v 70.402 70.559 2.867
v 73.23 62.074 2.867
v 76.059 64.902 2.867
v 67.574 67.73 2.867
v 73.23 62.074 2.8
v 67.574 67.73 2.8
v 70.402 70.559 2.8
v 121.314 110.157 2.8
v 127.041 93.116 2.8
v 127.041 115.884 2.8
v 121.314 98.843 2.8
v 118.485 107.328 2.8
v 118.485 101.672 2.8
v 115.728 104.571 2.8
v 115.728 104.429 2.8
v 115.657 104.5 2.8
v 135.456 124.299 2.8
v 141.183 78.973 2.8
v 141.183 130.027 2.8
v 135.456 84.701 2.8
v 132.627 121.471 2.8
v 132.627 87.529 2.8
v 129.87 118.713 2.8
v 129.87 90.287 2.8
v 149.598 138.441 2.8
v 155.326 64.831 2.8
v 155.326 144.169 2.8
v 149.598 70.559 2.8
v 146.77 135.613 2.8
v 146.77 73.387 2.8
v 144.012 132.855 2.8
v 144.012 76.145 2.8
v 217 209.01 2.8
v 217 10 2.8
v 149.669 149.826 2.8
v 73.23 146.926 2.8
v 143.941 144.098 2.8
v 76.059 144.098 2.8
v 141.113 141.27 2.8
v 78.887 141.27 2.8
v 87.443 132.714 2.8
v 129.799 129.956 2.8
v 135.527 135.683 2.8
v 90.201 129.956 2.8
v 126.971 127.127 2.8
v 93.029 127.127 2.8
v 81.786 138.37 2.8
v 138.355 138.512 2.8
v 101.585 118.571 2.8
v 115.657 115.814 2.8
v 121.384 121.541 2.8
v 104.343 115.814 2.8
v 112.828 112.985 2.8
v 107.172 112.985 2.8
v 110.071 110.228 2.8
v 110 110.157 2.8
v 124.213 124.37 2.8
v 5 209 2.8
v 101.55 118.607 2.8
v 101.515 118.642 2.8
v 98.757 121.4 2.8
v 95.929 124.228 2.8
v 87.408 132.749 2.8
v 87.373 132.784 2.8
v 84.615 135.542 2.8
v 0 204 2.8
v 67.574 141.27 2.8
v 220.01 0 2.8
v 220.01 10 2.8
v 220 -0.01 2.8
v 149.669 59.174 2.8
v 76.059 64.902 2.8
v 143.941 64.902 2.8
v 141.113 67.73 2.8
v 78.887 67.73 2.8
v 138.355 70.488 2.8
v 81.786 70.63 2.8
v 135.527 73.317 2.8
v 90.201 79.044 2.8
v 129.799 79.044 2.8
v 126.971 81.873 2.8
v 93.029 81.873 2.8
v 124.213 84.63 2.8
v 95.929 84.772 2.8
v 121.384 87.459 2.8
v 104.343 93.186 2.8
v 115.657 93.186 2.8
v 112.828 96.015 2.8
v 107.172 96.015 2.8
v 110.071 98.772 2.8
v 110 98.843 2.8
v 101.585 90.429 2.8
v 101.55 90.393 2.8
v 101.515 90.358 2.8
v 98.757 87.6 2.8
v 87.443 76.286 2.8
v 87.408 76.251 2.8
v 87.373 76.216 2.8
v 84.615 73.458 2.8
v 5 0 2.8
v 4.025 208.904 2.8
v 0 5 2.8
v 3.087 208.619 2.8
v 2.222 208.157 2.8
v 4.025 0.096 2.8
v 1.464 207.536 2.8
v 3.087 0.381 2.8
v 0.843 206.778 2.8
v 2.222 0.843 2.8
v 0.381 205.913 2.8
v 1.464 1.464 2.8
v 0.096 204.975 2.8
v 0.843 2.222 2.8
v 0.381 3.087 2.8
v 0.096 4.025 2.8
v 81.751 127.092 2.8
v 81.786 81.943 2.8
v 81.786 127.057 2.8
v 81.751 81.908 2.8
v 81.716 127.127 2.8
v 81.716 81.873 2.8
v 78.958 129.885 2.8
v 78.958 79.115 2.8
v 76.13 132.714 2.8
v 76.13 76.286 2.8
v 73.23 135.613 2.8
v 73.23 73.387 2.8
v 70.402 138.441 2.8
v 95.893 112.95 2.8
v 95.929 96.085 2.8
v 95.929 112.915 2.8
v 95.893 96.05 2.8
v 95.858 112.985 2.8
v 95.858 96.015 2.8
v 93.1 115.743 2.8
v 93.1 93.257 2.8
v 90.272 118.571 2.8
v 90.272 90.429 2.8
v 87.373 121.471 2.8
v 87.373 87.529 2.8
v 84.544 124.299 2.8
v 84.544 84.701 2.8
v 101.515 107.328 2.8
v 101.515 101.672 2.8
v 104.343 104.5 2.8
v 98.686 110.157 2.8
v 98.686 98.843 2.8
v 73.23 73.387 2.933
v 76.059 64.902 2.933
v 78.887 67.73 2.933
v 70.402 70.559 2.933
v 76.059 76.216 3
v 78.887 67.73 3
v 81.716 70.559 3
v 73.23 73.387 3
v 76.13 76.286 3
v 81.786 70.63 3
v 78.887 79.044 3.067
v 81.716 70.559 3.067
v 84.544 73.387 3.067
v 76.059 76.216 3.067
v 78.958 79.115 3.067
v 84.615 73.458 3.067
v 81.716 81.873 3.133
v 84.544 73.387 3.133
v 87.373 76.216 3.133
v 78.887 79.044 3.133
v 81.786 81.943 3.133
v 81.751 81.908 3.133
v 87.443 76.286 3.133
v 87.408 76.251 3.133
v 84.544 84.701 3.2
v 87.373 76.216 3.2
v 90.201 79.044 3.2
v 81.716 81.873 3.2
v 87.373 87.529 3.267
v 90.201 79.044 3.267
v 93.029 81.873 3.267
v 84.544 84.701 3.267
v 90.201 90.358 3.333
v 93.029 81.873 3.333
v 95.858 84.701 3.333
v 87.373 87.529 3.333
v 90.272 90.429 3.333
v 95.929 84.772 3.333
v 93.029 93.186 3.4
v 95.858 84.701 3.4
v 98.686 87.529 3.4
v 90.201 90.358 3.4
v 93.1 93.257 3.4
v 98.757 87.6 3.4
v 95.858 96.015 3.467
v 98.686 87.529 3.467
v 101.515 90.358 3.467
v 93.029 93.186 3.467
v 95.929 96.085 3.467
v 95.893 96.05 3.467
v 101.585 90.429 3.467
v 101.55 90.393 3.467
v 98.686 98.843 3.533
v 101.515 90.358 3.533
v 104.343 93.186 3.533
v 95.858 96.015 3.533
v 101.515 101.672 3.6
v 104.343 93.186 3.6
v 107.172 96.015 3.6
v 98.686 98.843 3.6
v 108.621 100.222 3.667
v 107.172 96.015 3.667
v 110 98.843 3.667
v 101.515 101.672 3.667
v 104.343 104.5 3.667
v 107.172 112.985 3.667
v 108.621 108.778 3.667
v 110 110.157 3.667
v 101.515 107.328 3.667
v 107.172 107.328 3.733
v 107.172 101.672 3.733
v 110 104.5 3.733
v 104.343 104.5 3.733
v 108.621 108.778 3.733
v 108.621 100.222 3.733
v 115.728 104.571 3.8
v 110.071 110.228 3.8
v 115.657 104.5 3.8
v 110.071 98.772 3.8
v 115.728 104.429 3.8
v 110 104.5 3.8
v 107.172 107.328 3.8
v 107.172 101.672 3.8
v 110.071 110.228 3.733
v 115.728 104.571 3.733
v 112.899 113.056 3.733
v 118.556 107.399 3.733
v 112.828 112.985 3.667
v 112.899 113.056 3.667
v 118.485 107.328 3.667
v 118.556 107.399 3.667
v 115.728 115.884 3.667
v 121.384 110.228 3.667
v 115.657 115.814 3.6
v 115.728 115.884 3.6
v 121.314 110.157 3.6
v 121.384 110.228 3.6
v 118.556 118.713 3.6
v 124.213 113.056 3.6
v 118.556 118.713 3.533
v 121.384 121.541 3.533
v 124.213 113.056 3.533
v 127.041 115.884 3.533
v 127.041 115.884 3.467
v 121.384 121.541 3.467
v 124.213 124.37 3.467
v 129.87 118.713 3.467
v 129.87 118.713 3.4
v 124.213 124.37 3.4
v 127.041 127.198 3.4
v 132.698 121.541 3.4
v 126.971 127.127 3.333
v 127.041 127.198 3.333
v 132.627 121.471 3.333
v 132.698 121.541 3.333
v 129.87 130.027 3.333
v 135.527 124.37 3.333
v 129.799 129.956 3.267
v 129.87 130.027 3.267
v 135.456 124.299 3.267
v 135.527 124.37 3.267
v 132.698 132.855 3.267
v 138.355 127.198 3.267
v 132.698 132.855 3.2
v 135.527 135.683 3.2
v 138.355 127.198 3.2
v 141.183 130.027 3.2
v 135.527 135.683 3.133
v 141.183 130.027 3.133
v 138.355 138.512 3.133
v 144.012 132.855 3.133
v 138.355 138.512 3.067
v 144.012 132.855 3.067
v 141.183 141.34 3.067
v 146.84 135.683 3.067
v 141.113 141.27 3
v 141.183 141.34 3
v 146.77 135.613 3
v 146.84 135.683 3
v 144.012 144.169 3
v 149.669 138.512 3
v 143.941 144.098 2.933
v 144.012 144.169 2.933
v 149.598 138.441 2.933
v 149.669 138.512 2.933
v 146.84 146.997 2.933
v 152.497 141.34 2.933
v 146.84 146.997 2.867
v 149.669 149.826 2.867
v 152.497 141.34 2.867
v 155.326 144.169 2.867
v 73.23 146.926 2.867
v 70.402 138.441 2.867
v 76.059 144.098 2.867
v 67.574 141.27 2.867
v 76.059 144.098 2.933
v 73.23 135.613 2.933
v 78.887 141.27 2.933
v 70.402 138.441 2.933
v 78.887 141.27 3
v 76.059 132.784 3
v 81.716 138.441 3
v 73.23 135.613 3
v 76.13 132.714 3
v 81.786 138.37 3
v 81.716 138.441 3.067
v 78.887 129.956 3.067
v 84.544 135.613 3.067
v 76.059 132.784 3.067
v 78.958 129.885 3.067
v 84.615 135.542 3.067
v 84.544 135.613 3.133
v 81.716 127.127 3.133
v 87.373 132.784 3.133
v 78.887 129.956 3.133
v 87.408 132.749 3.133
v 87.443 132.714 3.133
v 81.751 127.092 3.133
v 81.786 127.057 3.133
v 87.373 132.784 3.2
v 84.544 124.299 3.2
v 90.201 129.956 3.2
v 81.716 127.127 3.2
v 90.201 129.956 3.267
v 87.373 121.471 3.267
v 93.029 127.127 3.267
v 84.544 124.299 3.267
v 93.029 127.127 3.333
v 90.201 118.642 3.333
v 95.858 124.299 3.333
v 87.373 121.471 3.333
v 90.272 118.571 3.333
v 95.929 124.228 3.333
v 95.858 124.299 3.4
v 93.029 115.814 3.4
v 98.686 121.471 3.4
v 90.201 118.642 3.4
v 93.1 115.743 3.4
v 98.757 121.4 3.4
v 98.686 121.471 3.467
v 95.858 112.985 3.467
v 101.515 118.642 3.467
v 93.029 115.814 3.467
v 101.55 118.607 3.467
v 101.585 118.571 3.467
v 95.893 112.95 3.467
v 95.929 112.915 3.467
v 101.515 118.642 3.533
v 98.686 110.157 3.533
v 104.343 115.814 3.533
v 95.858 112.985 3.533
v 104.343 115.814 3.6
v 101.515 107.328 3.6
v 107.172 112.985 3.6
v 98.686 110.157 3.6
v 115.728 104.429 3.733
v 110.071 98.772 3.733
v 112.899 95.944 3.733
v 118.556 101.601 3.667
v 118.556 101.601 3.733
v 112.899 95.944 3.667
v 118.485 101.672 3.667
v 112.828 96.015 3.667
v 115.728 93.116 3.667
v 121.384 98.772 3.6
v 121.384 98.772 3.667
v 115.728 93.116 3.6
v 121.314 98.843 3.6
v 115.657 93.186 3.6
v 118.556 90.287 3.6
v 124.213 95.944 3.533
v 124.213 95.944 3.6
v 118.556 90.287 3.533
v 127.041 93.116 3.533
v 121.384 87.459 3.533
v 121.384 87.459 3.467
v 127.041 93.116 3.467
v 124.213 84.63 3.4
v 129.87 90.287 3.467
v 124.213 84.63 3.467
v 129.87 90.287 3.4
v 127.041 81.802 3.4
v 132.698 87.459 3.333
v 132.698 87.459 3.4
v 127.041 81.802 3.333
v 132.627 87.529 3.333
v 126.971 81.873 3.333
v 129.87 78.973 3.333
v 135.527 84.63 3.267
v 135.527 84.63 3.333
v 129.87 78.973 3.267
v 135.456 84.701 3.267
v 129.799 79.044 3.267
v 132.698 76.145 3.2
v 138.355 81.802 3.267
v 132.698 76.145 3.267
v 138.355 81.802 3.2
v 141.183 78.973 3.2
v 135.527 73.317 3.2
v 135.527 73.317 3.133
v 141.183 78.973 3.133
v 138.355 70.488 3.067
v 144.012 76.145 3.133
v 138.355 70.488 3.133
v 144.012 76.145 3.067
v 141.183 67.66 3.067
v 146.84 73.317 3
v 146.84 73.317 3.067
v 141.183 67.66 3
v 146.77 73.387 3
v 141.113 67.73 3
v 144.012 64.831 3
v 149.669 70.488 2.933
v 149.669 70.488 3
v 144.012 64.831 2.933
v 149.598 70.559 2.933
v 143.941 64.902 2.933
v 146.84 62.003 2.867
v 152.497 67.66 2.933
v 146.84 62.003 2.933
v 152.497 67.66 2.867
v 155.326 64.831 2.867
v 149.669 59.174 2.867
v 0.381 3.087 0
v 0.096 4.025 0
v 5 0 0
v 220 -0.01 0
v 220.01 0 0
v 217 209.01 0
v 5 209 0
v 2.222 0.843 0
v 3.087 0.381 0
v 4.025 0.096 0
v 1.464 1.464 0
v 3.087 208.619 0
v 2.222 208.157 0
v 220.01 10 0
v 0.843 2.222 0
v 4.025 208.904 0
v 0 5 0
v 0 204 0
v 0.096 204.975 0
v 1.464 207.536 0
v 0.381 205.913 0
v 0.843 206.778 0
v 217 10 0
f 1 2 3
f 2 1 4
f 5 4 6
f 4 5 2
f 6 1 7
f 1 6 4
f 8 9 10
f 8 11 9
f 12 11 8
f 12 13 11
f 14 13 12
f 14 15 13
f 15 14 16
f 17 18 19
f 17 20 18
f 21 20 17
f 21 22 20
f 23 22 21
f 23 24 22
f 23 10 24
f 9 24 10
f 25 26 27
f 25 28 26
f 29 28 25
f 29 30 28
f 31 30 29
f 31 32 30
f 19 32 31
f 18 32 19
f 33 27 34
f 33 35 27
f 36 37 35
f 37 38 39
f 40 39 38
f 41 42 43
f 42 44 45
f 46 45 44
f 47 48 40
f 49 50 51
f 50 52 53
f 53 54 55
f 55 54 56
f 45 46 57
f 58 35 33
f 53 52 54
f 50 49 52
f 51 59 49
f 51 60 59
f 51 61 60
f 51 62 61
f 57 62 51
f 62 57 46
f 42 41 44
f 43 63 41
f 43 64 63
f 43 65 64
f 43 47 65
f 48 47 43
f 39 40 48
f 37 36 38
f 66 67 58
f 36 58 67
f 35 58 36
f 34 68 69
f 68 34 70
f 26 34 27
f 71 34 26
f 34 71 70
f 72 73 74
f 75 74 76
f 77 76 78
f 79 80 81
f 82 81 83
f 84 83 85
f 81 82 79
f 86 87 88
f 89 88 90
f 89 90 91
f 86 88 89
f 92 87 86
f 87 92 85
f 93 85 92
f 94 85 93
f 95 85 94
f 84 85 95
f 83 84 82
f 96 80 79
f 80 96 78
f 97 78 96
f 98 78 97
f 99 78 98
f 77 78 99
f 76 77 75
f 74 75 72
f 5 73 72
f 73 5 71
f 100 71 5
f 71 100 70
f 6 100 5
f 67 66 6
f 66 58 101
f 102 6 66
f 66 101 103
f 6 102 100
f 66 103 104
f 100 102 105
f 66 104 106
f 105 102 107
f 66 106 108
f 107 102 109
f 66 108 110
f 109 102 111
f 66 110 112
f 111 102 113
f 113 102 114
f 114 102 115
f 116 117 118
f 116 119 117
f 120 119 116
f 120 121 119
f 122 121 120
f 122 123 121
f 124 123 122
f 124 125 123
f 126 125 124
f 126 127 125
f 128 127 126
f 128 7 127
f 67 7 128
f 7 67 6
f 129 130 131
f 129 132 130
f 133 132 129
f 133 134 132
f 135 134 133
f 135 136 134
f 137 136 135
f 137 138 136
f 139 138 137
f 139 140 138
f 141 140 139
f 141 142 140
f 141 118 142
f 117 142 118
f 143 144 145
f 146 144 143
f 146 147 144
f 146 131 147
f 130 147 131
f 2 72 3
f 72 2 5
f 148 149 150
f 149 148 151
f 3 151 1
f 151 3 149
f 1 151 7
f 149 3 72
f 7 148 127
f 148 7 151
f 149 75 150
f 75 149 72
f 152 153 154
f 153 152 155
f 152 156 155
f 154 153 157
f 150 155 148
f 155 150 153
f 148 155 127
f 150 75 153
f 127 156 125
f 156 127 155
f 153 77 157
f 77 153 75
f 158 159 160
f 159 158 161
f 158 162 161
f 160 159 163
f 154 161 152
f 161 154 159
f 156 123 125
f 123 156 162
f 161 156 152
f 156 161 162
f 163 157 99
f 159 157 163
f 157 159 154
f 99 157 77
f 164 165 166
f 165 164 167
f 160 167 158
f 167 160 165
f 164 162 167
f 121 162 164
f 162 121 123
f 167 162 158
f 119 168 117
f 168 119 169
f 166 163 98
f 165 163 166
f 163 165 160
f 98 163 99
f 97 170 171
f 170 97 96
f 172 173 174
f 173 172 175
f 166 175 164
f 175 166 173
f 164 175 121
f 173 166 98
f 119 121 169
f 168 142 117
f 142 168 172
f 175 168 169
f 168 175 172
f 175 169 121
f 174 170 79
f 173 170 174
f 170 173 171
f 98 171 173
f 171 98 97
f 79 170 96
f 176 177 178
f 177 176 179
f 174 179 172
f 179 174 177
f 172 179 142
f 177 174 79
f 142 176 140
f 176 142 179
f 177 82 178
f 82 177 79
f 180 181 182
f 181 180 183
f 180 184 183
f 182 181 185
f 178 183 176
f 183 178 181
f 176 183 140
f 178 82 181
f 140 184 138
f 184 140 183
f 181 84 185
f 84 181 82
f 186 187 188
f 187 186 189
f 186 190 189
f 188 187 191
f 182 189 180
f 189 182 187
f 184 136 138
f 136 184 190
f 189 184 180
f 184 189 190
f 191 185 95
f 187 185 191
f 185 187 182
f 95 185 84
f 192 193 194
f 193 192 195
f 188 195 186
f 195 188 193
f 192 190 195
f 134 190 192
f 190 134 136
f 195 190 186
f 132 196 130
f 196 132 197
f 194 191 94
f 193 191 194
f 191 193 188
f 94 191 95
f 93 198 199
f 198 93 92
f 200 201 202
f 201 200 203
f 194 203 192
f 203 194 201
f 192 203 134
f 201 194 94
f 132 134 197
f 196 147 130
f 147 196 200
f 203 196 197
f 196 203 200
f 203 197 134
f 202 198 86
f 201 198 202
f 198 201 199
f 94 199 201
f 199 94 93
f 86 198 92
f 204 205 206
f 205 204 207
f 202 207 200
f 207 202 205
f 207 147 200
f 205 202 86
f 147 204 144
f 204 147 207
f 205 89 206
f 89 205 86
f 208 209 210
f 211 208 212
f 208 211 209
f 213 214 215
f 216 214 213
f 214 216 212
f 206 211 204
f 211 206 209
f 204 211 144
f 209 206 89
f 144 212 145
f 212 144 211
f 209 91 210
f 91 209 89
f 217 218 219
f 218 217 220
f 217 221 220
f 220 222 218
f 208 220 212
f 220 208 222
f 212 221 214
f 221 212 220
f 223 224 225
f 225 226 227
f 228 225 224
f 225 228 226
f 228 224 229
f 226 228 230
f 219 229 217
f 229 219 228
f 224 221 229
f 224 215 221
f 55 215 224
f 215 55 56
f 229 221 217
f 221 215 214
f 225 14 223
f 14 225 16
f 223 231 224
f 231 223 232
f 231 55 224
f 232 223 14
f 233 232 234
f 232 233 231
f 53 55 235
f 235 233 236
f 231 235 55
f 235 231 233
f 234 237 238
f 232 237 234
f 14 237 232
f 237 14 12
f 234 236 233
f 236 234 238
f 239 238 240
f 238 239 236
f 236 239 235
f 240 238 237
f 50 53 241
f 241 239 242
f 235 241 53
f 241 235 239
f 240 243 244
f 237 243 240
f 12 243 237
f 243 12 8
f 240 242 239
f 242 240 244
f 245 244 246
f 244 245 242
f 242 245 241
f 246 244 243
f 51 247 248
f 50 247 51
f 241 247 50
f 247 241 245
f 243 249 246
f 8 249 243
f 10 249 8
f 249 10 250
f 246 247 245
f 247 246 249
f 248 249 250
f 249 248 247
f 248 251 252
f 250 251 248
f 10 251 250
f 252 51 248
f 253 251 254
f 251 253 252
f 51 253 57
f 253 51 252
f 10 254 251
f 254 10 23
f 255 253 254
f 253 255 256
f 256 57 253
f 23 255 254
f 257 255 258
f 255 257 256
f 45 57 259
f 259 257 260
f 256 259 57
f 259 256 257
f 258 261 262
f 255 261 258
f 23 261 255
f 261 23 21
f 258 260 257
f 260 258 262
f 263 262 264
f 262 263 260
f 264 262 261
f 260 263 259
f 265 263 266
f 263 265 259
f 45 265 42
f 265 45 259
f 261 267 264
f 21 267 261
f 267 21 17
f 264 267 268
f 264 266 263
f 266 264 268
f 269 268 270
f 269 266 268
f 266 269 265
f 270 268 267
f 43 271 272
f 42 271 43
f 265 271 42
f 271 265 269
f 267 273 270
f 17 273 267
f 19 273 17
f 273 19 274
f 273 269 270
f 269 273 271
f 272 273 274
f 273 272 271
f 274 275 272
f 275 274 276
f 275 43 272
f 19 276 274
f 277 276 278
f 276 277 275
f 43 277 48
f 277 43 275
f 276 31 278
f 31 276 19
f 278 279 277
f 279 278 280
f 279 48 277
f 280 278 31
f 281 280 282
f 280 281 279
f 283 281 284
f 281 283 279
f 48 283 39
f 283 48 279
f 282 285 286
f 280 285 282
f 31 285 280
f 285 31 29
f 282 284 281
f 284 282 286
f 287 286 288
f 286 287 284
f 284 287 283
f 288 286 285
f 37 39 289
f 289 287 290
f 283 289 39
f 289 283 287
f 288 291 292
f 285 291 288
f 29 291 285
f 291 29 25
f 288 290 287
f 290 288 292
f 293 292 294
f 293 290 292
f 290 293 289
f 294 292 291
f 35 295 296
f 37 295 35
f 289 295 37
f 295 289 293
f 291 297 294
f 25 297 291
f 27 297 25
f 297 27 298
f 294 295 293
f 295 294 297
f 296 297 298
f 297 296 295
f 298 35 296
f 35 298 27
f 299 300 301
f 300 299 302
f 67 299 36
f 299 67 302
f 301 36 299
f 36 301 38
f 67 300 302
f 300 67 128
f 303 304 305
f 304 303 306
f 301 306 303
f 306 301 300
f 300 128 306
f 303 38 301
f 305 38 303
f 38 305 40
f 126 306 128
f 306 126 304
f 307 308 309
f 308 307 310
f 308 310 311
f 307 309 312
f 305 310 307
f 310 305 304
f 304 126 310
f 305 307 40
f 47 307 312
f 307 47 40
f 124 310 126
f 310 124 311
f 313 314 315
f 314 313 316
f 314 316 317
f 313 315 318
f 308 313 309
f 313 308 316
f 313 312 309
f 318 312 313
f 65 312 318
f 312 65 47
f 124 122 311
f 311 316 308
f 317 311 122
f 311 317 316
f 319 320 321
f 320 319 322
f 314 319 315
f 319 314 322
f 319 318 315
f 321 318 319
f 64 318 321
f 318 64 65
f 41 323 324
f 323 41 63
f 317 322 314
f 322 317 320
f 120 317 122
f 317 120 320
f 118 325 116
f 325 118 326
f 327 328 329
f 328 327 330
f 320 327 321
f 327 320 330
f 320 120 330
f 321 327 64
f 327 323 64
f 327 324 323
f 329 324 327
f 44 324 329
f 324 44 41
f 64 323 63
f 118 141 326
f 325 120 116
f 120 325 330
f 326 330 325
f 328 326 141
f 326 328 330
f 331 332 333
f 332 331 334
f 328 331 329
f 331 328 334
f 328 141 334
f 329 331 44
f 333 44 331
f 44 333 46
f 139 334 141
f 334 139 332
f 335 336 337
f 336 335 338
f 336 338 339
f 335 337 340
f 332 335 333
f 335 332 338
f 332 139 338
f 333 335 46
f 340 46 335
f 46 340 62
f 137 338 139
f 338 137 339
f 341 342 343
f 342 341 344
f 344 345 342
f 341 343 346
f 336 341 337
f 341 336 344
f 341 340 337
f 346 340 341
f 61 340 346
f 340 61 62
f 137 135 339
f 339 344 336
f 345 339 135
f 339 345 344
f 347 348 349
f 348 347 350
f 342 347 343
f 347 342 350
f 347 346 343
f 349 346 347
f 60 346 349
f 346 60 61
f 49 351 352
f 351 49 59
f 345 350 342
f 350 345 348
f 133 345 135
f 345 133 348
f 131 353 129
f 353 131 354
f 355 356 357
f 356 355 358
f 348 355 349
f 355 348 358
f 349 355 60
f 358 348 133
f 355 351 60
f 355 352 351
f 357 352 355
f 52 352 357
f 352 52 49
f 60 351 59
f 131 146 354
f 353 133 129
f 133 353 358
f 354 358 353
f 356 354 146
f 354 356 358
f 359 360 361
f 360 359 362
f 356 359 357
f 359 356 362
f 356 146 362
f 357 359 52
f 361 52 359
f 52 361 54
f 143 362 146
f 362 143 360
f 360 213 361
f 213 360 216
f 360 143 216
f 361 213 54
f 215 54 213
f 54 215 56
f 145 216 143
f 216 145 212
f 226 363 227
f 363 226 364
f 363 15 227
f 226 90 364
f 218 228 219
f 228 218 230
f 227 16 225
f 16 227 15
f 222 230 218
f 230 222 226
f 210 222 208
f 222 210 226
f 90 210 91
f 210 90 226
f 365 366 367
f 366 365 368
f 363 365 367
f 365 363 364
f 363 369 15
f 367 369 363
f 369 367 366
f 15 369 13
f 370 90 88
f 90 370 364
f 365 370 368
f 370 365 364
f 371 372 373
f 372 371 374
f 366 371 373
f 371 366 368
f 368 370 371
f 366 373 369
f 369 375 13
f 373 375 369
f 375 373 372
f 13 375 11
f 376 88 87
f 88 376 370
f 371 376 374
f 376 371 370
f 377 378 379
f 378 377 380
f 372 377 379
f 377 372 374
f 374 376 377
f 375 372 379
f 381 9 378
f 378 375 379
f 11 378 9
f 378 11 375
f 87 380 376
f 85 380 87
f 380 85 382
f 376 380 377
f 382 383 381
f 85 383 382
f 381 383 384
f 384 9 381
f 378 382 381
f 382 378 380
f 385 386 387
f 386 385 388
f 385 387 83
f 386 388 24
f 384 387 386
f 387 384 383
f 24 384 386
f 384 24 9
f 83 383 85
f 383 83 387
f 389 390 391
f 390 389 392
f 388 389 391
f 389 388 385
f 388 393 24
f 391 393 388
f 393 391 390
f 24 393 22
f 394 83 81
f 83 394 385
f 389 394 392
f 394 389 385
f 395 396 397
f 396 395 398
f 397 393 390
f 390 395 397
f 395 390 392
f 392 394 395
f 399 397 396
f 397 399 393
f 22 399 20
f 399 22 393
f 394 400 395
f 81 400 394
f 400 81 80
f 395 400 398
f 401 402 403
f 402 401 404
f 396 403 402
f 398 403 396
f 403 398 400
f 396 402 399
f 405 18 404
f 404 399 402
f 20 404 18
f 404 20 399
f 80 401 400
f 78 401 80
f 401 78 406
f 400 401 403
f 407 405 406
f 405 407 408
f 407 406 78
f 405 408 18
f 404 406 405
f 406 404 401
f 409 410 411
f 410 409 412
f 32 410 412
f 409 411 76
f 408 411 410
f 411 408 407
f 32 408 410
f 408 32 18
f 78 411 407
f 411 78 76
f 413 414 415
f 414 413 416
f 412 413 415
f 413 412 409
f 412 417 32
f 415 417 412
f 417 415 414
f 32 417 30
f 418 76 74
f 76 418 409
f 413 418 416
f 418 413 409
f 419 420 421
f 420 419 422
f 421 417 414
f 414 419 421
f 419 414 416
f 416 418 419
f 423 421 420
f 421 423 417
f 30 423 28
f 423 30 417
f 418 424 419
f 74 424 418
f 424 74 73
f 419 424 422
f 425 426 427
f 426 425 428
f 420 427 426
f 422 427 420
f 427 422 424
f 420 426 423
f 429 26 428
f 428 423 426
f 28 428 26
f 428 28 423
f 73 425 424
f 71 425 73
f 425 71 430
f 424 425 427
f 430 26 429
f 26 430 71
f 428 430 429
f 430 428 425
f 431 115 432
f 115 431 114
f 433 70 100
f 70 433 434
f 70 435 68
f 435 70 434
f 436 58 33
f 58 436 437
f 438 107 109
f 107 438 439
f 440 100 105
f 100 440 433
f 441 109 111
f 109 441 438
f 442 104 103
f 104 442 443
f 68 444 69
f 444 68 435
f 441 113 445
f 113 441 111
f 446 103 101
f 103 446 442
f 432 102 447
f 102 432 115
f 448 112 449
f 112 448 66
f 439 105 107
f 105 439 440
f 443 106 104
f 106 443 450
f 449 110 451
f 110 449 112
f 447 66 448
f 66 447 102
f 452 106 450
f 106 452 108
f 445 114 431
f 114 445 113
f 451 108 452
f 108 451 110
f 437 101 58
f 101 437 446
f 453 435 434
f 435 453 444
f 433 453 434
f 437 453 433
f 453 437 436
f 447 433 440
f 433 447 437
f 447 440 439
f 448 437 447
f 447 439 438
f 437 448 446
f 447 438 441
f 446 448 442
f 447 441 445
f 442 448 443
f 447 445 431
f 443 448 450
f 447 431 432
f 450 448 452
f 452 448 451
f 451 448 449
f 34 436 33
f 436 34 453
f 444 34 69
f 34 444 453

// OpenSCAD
// 滑槽拼接 - 方向1：上下方向
// A部分：220mm × 209mm × 2.8mm
// 滑槽从上往下

// 参数
width = 220;     // 宽度 (mm)
height = 209;    // 高度 (mm)
thickness = 2.8; // 厚度 (mm)
corner_radius = 5;  // 倒角半径 (mm)

// 滑槽参数
slot_depth = 3;       // 槽深度 (mm)
slot_height = 3;      // 槽高度 (mm)
slot_length = 200;    // 槽长度 (mm)
slot_offset = 10;      // 槽距离边缘 (mm)

// X 图案参数
x_max_height = 1.0;
x_width = 8;
x_diagonal = 120;

// 圆角矩形模块（右侧不倒角）
module rounded_rect_right_flat(w, h, r, t) {
    hull() {
        translate([r, r, 0]) cylinder(h = t, r = r, $fn = 32);
        translate([r, h - r, 0]) cylinder(h = t, r = r, $fn = 32);
        translate([w, h, 0]) cylinder(h = t, r = 0.01, $fn = 4);
        translate([w, 0, 0]) cylinder(h = t, r = 0.01, $fn = 4);
    }
}

// 创建主体
difference() {
    union() {
        // 面板主体
        color("LightGray") {
            rounded_rect_right_flat(width, height, corner_radius, thickness);
        }

        // X 图案
        color("DarkGray") {
            translate([width/2, height/2, 0])
            x_pattern();
        }
    }

    // 滑槽（在右侧，上下方向，从上往下）
    color("Red") {
        translate([width - slot_depth, slot_offset, -0.1])
        cube([slot_depth + 0.2, slot_length, slot_height + 0.2]);
    }
}

// X 图案模块
module x_pattern() {
    segments = 30;
    segment_length = x_diagonal / segments;

    union() {
        for (i = [-segments/2:segments/2-1]) {
            dist_ratio = abs(i) / (segments/2);
            current_height = x_max_height * (1 - dist_ratio);

            translate([0, 0, thickness])
            rotate([0, 0, 45])
            translate([i * segment_length, -x_width/2, 0])
            cube([segment_length + 0.1, x_width, current_height]);
        }

        for (i = [-segments/2:segments/2-1]) {
            dist_ratio = abs(i) / (segments/2);
            current_height = x_max_height * (1 - dist_ratio);

            translate([0, 0, thickness])
            rotate([0, 0, -45])
            translate([i * segment_length, -x_width/2, 0])
            cube([segment_length + 0.1, x_width, current_height]);
        }
    }
}
